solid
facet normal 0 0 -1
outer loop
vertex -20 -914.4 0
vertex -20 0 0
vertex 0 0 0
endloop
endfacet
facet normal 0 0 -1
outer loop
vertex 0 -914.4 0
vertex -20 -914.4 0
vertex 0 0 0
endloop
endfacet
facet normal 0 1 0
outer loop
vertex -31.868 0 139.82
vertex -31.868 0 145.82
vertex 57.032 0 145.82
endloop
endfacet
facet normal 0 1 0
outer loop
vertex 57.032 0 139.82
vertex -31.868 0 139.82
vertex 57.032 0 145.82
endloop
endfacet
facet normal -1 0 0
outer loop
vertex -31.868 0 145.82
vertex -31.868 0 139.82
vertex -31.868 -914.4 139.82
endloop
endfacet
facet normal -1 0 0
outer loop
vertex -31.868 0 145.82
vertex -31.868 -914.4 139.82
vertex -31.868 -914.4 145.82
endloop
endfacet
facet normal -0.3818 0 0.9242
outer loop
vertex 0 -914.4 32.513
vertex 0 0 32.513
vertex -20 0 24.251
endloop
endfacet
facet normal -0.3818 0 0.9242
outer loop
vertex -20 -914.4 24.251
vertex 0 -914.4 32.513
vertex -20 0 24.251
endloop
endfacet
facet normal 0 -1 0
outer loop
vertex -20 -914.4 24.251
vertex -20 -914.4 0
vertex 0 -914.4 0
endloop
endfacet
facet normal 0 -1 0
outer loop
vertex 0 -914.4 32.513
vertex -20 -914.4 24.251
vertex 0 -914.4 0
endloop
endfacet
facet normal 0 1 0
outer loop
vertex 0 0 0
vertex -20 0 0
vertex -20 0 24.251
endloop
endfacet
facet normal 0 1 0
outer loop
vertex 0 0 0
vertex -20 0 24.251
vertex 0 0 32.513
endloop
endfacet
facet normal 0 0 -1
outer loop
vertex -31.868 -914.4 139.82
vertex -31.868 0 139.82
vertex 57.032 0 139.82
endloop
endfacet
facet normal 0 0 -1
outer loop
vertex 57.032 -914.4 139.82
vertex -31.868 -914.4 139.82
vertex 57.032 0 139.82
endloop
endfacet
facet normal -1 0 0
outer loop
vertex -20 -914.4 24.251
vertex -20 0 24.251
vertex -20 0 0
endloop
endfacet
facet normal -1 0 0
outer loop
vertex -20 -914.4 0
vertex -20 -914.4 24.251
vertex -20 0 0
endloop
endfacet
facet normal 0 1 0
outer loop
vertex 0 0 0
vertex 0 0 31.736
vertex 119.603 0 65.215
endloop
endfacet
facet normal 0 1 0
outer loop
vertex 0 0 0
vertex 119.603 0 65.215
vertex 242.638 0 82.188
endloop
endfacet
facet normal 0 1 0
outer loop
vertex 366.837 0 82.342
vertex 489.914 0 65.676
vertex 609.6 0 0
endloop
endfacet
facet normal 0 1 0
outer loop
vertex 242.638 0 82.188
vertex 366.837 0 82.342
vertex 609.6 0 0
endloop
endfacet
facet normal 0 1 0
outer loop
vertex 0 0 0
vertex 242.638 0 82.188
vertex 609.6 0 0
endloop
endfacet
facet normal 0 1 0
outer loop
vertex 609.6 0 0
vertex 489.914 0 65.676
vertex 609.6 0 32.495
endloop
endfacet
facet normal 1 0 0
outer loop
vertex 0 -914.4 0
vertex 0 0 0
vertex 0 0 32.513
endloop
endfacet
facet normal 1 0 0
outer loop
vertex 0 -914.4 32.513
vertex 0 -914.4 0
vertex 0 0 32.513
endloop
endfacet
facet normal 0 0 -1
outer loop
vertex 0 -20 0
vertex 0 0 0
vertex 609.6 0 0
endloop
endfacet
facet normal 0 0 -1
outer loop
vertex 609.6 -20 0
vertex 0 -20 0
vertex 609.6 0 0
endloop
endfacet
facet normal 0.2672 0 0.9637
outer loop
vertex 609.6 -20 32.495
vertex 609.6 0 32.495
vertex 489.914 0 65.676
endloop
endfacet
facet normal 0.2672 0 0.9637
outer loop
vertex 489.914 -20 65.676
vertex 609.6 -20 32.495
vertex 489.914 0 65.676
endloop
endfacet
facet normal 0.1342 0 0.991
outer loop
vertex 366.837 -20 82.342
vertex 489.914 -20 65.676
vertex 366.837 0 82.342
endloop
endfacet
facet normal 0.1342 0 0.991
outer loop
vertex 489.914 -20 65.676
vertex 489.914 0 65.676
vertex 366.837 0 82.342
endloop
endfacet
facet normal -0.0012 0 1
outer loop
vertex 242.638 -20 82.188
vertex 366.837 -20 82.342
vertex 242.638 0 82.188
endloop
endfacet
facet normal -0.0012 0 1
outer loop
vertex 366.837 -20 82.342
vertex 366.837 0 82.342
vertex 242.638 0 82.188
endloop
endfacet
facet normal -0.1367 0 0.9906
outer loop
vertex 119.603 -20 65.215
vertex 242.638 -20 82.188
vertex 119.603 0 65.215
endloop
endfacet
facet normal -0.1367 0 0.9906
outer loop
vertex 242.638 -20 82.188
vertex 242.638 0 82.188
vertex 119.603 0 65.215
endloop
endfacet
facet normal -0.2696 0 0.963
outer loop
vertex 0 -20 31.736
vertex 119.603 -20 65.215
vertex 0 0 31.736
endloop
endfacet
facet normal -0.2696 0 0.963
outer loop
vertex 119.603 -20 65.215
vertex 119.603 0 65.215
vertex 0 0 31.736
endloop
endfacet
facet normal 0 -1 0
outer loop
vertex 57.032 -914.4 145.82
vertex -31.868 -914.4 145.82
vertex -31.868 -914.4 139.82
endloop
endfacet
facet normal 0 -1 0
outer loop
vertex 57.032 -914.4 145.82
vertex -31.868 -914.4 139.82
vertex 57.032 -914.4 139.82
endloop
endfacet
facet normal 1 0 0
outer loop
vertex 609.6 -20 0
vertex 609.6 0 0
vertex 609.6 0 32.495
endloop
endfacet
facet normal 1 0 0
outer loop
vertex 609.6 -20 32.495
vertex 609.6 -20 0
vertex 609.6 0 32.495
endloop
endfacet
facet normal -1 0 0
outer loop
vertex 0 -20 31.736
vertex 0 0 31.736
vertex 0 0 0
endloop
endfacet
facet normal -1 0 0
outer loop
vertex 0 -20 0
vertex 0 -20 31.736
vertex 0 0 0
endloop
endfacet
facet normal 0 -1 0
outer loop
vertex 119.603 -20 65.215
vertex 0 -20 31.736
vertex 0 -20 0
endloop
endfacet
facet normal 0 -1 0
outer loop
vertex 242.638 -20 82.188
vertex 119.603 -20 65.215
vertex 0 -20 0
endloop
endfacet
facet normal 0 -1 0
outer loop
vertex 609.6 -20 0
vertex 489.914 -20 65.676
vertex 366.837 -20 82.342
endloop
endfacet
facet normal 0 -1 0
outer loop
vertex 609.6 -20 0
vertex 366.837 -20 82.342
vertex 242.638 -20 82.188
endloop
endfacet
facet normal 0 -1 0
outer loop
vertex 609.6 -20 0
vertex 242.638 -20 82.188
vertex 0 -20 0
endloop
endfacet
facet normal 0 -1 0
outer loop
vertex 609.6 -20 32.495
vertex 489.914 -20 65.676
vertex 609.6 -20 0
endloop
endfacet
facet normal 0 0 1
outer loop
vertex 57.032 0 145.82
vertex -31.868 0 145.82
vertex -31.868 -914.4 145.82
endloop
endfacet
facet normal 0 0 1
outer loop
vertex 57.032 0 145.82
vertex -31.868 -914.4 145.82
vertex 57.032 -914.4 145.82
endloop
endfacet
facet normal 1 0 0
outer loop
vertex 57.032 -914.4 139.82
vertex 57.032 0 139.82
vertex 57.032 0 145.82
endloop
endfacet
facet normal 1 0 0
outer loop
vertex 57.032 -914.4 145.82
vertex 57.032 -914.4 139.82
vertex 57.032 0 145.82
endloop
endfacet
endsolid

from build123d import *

# Parameters (mm, degrees)
F1_DEPTH = 20
F2_W     = 88.9
F2_H     = 6
F3_DEPTH = 914.4
F5_DEPTH = 914.4


with BuildPart() as f1:
    # F0 (on Front) → F1 (new body)
    with BuildSketch(Plane.XZ):
        with BuildLine():
            Line((0, 31.73589), (0, 0))
            Line((0, 0), (609.6, 0))
            Line((609.6, 0), (609.6, 32.495205))
            ThreePointArc((609.6, 32.495205), (304.734906, 84.374633), (0, 31.73589))
        make_face()
    extrude(amount=F1_DEPTH)


with BuildPart() as f3:
    # F2 (on Front) → F3 (new body)
    with BuildSketch(Plane.XZ):
        with Locations((12.581605, 142.819503)):
            Rectangle(F2_W, F2_H)
    extrude(amount=F3_DEPTH)


with BuildPart() as f5:
    # F4 (on Front) → F5 (new body)
    with BuildSketch(Plane.XZ):
        Polygon((-20, 0), (0, 0), (0, 32.513209), (-20, 24.250794), align=None)
    extrude(amount=F5_DEPTH)


solid = Compound([f1.part, f3.part, f5.part])
